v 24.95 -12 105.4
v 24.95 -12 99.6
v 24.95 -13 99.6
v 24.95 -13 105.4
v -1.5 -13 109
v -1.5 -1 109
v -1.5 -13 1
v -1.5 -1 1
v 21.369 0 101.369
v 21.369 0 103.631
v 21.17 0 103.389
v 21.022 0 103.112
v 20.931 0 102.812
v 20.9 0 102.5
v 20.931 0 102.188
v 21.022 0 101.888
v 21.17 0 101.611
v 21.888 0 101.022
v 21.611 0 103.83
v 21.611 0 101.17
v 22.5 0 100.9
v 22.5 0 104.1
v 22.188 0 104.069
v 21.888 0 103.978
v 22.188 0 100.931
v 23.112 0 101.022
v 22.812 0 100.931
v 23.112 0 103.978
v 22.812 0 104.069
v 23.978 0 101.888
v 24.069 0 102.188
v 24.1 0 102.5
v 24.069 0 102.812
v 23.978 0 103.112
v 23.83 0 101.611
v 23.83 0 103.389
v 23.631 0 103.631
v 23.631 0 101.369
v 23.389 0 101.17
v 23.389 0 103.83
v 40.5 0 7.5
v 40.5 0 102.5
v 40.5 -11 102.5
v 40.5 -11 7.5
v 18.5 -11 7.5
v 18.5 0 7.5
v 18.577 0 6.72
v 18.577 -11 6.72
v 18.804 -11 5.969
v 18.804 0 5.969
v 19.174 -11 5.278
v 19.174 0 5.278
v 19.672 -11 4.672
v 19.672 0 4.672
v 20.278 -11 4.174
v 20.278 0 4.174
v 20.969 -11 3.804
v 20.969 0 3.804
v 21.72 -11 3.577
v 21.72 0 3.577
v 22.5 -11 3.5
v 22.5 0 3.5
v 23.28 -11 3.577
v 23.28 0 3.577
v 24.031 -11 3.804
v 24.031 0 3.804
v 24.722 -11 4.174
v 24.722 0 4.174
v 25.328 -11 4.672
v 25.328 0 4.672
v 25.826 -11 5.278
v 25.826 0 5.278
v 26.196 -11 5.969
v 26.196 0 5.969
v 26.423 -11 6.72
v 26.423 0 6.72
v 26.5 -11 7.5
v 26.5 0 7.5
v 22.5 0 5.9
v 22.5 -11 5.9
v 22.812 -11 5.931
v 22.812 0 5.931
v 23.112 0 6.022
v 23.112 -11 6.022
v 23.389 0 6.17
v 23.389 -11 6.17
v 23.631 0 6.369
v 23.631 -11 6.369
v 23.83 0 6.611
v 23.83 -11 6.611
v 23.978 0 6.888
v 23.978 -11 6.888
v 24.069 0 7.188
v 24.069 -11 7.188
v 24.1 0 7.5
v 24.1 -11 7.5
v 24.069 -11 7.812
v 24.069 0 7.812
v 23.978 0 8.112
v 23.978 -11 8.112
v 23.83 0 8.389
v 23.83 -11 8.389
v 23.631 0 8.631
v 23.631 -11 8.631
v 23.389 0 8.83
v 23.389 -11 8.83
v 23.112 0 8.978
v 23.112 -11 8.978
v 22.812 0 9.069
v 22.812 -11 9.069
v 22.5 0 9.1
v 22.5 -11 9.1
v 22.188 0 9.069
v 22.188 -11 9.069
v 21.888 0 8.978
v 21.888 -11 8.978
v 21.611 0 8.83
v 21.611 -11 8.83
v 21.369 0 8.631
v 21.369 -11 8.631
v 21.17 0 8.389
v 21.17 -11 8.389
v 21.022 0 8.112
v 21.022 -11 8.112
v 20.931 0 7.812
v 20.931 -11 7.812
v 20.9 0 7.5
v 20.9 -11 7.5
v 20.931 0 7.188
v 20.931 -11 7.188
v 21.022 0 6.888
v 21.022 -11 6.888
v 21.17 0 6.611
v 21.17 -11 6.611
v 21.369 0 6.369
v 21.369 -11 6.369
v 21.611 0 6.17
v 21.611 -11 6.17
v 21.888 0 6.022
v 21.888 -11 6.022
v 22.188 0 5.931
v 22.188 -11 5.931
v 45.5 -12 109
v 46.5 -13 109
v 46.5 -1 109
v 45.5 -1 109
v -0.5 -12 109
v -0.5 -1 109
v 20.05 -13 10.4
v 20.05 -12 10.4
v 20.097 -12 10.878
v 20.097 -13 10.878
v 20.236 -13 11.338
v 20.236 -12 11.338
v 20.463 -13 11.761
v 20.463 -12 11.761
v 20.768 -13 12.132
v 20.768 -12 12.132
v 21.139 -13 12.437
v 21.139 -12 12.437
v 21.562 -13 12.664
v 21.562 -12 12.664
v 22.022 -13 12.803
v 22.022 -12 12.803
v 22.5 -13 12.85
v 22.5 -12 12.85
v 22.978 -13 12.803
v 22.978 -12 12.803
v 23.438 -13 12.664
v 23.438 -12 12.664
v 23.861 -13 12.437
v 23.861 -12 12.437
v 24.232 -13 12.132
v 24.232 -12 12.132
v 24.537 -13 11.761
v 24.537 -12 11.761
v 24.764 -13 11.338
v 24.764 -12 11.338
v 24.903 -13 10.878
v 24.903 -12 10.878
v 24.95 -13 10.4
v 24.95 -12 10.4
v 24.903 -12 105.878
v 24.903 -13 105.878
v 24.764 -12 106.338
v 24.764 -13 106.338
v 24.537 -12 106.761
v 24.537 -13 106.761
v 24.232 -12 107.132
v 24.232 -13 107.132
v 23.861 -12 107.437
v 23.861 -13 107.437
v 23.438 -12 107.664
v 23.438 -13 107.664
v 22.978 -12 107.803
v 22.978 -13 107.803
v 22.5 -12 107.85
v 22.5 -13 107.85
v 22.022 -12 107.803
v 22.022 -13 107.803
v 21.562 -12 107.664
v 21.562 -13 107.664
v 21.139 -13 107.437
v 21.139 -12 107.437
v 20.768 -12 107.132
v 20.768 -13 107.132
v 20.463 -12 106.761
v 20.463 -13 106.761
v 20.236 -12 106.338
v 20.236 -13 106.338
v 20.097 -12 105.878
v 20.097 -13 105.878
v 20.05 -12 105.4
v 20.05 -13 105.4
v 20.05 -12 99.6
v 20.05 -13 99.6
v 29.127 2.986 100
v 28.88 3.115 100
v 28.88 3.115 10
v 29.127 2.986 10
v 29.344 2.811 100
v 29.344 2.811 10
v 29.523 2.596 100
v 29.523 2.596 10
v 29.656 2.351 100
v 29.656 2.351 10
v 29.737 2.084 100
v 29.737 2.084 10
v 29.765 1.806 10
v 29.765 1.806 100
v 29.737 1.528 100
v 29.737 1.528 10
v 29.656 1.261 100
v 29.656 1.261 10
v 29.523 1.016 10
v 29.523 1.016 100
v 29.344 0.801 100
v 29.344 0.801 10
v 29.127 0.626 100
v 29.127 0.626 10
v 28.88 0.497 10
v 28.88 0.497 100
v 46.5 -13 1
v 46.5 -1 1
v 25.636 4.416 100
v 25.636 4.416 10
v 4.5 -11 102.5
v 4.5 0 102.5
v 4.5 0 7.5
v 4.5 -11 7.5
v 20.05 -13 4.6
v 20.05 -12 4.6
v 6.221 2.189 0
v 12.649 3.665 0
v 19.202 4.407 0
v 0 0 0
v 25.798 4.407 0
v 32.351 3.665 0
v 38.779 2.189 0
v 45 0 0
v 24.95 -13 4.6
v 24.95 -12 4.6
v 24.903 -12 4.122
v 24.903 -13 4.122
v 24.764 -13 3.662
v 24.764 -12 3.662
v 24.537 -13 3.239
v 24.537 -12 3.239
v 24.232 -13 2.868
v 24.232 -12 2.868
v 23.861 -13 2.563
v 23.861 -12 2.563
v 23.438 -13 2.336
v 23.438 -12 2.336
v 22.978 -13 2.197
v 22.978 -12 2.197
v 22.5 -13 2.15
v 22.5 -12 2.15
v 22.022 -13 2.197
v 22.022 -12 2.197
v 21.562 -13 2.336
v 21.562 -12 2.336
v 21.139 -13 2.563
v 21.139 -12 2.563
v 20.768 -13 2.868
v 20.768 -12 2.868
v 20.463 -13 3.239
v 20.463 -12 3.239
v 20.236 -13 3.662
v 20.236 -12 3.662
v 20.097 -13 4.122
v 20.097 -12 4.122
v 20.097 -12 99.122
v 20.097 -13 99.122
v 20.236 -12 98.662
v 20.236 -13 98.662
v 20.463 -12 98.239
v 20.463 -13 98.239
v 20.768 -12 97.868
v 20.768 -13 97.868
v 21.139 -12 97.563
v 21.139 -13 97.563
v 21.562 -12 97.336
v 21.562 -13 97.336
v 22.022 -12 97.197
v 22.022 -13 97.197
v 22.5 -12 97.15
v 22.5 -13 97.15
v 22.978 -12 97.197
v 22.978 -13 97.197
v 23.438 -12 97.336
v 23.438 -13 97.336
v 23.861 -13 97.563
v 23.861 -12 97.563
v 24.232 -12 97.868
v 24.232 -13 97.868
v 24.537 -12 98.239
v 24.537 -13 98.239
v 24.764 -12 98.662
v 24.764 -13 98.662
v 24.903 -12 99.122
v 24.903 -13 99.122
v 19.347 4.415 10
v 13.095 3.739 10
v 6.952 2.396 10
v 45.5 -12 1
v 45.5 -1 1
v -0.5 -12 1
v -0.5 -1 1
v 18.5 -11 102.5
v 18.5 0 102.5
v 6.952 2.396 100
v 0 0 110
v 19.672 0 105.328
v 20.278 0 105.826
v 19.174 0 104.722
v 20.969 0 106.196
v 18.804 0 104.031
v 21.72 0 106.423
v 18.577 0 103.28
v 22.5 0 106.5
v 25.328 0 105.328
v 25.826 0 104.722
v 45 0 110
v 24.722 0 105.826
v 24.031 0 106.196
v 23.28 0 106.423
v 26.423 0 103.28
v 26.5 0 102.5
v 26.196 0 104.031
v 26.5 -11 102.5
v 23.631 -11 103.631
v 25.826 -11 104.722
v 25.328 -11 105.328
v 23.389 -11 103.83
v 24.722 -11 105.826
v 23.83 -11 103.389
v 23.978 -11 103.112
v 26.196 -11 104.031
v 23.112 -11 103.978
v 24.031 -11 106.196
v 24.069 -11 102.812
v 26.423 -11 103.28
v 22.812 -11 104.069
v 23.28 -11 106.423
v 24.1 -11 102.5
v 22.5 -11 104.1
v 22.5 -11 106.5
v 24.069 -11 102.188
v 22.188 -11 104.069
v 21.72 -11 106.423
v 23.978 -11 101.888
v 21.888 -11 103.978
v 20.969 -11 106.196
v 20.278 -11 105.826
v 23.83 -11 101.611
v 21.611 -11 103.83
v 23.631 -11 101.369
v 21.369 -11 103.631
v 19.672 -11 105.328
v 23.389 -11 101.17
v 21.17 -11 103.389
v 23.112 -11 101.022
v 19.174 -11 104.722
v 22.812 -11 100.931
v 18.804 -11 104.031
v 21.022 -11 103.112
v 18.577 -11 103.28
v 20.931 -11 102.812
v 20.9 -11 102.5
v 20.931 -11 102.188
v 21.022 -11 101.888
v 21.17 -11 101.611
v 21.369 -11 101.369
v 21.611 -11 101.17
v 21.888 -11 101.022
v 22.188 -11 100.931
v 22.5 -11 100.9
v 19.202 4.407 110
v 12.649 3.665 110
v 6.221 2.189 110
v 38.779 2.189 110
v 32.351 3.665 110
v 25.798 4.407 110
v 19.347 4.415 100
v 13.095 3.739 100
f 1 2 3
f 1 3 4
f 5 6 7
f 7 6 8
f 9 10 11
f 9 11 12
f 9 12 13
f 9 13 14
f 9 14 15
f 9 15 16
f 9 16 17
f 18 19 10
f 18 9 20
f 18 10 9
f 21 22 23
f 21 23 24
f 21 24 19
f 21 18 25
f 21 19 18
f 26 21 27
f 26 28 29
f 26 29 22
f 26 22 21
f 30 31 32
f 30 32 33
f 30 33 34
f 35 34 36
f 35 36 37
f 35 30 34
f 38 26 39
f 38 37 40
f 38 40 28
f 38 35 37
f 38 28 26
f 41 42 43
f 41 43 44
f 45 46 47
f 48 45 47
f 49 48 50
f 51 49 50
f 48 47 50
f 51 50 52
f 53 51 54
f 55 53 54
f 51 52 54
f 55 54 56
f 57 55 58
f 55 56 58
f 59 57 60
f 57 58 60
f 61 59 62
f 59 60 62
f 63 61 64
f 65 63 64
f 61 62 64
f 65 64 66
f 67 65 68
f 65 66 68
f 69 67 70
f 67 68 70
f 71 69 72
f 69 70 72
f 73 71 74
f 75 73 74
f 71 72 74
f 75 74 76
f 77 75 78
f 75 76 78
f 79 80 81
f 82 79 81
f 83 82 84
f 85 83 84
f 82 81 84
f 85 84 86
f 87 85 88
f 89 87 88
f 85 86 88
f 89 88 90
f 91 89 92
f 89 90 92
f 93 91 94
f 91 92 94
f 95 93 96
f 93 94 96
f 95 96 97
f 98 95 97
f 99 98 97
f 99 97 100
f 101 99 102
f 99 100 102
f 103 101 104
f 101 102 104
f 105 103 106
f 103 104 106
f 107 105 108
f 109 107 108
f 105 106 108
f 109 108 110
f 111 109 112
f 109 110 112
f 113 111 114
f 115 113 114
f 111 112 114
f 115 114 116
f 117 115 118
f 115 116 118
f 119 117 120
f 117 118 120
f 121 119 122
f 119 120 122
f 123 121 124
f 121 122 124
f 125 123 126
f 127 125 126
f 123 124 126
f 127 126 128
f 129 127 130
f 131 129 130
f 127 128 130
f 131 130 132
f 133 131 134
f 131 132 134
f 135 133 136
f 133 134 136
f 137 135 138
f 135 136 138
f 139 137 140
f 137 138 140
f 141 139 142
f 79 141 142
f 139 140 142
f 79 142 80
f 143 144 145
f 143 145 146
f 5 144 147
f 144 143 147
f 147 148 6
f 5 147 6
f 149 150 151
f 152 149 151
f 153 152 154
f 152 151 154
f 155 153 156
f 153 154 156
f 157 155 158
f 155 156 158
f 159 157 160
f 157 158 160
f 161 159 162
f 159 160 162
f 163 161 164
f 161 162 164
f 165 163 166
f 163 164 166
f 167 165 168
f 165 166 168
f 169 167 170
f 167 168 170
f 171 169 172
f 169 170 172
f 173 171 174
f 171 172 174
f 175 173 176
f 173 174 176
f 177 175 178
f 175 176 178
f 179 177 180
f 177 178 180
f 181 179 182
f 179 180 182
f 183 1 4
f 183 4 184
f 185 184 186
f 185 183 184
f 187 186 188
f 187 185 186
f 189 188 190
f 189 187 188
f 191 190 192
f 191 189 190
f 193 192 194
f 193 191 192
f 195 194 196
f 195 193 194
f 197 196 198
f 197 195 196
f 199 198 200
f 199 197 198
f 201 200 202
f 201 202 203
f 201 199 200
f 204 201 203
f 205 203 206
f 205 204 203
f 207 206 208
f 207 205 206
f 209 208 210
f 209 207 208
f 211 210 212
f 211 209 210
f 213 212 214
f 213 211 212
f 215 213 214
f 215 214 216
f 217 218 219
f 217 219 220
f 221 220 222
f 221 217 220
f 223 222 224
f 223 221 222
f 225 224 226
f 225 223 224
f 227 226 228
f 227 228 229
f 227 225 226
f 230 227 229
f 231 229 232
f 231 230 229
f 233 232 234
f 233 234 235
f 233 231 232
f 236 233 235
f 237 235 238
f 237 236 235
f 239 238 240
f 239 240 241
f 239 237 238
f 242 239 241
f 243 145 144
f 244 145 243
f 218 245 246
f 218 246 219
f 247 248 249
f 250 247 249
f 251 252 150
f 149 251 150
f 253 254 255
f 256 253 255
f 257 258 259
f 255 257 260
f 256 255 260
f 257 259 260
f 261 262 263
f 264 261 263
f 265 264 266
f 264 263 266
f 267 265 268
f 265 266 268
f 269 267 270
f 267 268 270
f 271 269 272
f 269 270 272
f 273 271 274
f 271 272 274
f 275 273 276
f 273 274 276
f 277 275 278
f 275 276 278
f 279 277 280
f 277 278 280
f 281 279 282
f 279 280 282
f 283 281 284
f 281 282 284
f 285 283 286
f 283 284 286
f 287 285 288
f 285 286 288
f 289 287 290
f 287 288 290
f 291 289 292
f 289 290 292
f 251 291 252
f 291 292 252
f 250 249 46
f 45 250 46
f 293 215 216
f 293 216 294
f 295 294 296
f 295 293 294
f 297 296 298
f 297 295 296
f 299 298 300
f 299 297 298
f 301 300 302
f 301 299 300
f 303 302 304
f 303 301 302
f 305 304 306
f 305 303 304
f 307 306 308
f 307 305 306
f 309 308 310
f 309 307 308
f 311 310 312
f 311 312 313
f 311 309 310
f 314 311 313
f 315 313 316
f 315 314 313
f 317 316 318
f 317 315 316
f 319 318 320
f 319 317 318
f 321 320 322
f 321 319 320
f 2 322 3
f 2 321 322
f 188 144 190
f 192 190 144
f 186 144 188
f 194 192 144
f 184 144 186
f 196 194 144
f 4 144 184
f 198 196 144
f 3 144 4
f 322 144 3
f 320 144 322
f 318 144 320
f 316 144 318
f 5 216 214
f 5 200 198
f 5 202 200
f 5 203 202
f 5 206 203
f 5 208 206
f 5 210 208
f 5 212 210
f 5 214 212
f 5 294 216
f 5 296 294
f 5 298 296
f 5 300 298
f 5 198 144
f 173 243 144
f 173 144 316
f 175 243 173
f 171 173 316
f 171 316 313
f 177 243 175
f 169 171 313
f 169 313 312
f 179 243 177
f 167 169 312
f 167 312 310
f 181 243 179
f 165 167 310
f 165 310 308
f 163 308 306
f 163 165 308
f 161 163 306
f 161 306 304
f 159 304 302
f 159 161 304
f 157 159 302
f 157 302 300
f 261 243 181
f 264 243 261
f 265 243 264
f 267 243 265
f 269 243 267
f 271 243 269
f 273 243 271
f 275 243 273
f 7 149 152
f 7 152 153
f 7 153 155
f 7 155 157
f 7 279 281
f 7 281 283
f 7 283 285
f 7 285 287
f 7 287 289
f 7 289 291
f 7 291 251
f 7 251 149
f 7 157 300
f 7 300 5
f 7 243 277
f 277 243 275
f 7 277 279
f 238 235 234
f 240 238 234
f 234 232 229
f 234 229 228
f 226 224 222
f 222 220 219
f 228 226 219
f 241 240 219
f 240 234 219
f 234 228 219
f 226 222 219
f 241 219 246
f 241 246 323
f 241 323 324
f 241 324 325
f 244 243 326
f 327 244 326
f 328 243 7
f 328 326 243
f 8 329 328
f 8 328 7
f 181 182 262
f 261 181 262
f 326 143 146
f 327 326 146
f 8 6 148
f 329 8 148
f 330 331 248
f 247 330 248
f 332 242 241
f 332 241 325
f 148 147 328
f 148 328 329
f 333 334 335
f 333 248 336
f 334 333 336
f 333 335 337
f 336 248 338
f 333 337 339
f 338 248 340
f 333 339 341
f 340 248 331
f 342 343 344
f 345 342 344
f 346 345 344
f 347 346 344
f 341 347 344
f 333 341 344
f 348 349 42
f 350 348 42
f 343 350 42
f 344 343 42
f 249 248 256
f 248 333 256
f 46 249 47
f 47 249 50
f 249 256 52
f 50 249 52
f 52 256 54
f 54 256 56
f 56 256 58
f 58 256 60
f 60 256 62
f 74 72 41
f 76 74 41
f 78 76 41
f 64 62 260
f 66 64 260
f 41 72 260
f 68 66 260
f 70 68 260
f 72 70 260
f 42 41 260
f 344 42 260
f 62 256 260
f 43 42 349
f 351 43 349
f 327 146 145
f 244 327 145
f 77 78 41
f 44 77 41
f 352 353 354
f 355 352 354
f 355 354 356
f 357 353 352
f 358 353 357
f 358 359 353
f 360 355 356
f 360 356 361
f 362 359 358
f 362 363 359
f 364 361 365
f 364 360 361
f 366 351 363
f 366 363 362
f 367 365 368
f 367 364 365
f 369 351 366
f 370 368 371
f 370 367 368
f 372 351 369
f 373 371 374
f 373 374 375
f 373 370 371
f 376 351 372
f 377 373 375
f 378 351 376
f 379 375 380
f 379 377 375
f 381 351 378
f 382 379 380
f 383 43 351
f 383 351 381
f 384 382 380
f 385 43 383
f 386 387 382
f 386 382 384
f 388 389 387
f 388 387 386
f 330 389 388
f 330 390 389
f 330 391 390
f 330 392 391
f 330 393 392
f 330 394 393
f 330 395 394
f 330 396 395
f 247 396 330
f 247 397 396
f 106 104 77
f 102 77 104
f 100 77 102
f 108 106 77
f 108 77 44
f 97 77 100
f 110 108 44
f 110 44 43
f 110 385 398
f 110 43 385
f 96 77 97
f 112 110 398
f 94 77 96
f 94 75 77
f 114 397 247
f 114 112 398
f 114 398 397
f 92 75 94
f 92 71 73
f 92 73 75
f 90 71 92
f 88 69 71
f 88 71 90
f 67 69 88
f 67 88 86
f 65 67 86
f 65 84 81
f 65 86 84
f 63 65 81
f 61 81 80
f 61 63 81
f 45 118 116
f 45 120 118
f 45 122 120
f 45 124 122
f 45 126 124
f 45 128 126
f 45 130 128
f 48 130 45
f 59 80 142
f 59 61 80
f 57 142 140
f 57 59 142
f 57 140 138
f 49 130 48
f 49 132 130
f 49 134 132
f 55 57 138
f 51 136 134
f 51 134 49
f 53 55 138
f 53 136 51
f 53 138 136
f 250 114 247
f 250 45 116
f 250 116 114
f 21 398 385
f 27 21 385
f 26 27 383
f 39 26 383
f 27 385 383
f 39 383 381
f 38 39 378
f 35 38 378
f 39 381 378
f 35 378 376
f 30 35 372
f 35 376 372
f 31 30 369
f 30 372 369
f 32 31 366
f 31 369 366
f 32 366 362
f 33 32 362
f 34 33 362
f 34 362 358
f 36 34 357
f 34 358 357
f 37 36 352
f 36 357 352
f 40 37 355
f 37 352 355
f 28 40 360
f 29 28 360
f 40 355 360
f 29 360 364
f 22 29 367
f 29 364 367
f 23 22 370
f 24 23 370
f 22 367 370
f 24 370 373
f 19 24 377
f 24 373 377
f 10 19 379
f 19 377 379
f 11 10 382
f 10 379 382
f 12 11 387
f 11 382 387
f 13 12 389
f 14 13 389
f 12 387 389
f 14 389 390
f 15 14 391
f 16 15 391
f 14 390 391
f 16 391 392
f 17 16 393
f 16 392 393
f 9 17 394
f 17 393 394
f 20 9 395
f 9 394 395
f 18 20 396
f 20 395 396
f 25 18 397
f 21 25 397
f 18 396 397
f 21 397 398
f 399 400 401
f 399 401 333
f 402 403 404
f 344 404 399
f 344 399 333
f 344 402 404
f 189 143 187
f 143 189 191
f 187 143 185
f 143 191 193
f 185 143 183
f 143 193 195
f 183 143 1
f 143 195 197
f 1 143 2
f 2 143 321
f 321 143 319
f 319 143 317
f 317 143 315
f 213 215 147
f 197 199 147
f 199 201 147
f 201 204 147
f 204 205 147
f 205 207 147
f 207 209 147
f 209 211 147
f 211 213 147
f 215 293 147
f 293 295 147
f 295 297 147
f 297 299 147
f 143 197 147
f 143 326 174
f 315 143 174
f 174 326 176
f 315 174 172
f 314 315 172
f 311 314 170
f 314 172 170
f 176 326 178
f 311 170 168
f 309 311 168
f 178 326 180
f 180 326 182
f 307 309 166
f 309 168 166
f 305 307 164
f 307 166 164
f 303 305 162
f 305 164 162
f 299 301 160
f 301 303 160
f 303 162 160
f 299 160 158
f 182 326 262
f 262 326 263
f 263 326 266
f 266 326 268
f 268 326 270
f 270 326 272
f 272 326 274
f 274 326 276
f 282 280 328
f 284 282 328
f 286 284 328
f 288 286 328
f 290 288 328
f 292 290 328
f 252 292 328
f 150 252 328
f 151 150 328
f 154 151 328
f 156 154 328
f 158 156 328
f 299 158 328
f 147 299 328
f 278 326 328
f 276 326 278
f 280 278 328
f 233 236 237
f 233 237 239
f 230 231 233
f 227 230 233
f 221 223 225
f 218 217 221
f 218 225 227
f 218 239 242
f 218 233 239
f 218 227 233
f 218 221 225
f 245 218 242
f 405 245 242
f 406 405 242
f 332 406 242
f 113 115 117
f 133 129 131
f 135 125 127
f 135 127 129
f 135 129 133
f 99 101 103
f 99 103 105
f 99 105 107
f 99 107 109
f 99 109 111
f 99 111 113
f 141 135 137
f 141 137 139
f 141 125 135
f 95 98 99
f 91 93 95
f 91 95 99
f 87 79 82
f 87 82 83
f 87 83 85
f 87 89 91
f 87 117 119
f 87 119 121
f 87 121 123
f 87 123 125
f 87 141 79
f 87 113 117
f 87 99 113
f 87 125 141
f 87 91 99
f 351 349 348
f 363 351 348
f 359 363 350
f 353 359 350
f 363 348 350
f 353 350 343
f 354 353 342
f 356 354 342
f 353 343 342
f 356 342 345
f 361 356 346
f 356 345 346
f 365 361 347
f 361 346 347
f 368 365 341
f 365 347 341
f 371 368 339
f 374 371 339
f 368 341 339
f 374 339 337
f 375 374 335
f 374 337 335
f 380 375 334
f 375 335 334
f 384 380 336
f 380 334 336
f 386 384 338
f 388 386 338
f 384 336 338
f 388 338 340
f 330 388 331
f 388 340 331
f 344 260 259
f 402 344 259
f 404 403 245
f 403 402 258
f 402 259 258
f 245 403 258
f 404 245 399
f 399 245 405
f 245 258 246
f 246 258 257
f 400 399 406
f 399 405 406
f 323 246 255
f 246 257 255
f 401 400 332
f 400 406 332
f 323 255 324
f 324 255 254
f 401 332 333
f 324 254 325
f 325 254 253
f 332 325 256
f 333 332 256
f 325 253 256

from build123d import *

# Parameters (mm, degrees)
EXTRUDE_1_DEPTH          = 110
SKETCH_2_W               = 14
SKETCH_2_H               = 95
SKETCH_2_W_2             = 8
EXTRUDE_2_DEPTH          = 11
SKETCH_3_R               = 1.6
CUT_EXTRUDE_1_DEPTH      = 11
SKETCH_4_W               = 48
SKETCH_4_H               = 108
EXTRUDE_3_DEPTH          = 1
SKETCH_5_W               = 1
SKETCH_5_H               = 12
EXTRUDE_4_DEPTH          = 108
CUT_EXTRUDE_2_DEPTH      = 45
CUT_EXTRUDE_2_DEPTH_BACK = 45


with BuildPart() as part:
    # 草图1 → 凸台-拉伸1 (new body)
    with BuildSketch(Plane.XY):
        with BuildLine():
            Line((0, 0), (45, 0))
            ThreePointArc((45, 0), (22.5, 4.5), (0, 0))
        make_face()
    extrude(amount=EXTRUDE_1_DEPTH)

    # 草图2 → 凸台-拉伸2 (add)
    with BuildSketch(Plane(origin=(0, 0, 0), x_dir=(-1, 0, 0), z_dir=(0, -1, 0))):
        with Locations((-11.5, -55)):
            Rectangle(SKETCH_2_W, SKETCH_2_H)
        with Locations((-22.5, -55)):
            Rectangle(SKETCH_2_W_2, SKETCH_2_H)
        with BuildLine():
            ThreePointArc((-26.5, -102.5), (-22.5, -106.5), (-18.5, -102.5))
            Line((-18.5, -102.5), (-26.5, -102.5))
        make_face()
        with Locations((-33.5, -55)):
            Rectangle(SKETCH_2_W, SKETCH_2_H)
        with BuildLine():
            Line((-26.5, -7.5), (-18.5, -7.5))
            ThreePointArc((-18.5, -7.5), (-22.5, -3.5), (-26.5, -7.5))
        make_face()
    extrude(amount=EXTRUDE_2_DEPTH)

    # 草图3 → 切除-拉伸1 (cut)
    with BuildSketch(Plane.XZ.offset(11)):
        with Locations(Location((22.5, 102.5, 0), (0, 0, 270))):
            Circle(SKETCH_3_R)
        with Locations(Location((22.5, 7.5, 0), (0, 0, 270))):
            Circle(SKETCH_3_R)
    extrude(amount=-CUT_EXTRUDE_1_DEPTH, mode=Mode.SUBTRACT)

    # 草图6 → 切除-拉伸2 (cut, two sides: drawn at the far end of the back side and taken through both)
    with BuildSketch(Plane(origin=(0, 0, 55), x_dir=(-1, 0, 0), z_dir=(0, 0, -1)).offset(-CUT_EXTRUDE_2_DEPTH_BACK)):
        with BuildLine():
            Line((-25.6355376, 4.415908826), (-28.879652294, 3.114923831))
            ThreePointArc((-28.879652294, 3.114923831), (-29.764951758, 1.806057322), (-28.879652294, 0.497190812))
            Line((-28.879652294, 0.497190812), (-5.388413498, 2.531348361))
            Line((-5.388413498, 2.531348361), (-21.708969166, 7.754187451))
            Line((-21.708969166, 7.754187451), (-25.6355376, 4.415908826))
        make_face()
    extrude(amount=CUT_EXTRUDE_2_DEPTH + CUT_EXTRUDE_2_DEPTH_BACK, mode=Mode.SUBTRACT)


with BuildPart() as body_2:
    # 草图4 → 凸台-拉伸3 (new body)
    with BuildSketch(Plane(origin=(0, -12, 0), x_dir=(-1, 0, 0), z_dir=(0, -1, 0))):
        with Locations((-22.5, -55)):
            Rectangle(SKETCH_4_W, SKETCH_4_H)
        with BuildLine():
            Line((-20.05, -4.6), (-20.05, -10.4))
            ThreePointArc((-20.05, -10.4), (-22.5, -12.85), (-24.95, -10.4))
            Line((-24.95, -10.4), (-24.95, -4.6))
            ThreePointArc((-24.95, -4.6), (-22.5, -2.15), (-20.05, -4.6))
        make_face(mode=Mode.SUBTRACT)
        with BuildLine():
            Line((-20.05, -105.4), (-20.05, -99.6))
            ThreePointArc((-20.05, -99.6), (-22.5, -97.15), (-24.95, -99.6))
            Line((-24.95, -99.6), (-24.95, -105.4))
            ThreePointArc((-24.95, -105.4), (-22.5, -107.85), (-20.05, -105.4))
        make_face(mode=Mode.SUBTRACT)
    extrude(amount=EXTRUDE_3_DEPTH)

    # 草图5 → 凸台-拉伸4 (add)
    with BuildSketch(Plane.XY.offset(109)):
        with Locations((-1, -7)):
            Rectangle(SKETCH_5_W, SKETCH_5_H)
        with Locations((46, -7)):
            Rectangle(SKETCH_5_W, SKETCH_5_H)
    extrude(amount=-EXTRUDE_4_DEPTH)


solid = Compound([part.part, body_2.part])
